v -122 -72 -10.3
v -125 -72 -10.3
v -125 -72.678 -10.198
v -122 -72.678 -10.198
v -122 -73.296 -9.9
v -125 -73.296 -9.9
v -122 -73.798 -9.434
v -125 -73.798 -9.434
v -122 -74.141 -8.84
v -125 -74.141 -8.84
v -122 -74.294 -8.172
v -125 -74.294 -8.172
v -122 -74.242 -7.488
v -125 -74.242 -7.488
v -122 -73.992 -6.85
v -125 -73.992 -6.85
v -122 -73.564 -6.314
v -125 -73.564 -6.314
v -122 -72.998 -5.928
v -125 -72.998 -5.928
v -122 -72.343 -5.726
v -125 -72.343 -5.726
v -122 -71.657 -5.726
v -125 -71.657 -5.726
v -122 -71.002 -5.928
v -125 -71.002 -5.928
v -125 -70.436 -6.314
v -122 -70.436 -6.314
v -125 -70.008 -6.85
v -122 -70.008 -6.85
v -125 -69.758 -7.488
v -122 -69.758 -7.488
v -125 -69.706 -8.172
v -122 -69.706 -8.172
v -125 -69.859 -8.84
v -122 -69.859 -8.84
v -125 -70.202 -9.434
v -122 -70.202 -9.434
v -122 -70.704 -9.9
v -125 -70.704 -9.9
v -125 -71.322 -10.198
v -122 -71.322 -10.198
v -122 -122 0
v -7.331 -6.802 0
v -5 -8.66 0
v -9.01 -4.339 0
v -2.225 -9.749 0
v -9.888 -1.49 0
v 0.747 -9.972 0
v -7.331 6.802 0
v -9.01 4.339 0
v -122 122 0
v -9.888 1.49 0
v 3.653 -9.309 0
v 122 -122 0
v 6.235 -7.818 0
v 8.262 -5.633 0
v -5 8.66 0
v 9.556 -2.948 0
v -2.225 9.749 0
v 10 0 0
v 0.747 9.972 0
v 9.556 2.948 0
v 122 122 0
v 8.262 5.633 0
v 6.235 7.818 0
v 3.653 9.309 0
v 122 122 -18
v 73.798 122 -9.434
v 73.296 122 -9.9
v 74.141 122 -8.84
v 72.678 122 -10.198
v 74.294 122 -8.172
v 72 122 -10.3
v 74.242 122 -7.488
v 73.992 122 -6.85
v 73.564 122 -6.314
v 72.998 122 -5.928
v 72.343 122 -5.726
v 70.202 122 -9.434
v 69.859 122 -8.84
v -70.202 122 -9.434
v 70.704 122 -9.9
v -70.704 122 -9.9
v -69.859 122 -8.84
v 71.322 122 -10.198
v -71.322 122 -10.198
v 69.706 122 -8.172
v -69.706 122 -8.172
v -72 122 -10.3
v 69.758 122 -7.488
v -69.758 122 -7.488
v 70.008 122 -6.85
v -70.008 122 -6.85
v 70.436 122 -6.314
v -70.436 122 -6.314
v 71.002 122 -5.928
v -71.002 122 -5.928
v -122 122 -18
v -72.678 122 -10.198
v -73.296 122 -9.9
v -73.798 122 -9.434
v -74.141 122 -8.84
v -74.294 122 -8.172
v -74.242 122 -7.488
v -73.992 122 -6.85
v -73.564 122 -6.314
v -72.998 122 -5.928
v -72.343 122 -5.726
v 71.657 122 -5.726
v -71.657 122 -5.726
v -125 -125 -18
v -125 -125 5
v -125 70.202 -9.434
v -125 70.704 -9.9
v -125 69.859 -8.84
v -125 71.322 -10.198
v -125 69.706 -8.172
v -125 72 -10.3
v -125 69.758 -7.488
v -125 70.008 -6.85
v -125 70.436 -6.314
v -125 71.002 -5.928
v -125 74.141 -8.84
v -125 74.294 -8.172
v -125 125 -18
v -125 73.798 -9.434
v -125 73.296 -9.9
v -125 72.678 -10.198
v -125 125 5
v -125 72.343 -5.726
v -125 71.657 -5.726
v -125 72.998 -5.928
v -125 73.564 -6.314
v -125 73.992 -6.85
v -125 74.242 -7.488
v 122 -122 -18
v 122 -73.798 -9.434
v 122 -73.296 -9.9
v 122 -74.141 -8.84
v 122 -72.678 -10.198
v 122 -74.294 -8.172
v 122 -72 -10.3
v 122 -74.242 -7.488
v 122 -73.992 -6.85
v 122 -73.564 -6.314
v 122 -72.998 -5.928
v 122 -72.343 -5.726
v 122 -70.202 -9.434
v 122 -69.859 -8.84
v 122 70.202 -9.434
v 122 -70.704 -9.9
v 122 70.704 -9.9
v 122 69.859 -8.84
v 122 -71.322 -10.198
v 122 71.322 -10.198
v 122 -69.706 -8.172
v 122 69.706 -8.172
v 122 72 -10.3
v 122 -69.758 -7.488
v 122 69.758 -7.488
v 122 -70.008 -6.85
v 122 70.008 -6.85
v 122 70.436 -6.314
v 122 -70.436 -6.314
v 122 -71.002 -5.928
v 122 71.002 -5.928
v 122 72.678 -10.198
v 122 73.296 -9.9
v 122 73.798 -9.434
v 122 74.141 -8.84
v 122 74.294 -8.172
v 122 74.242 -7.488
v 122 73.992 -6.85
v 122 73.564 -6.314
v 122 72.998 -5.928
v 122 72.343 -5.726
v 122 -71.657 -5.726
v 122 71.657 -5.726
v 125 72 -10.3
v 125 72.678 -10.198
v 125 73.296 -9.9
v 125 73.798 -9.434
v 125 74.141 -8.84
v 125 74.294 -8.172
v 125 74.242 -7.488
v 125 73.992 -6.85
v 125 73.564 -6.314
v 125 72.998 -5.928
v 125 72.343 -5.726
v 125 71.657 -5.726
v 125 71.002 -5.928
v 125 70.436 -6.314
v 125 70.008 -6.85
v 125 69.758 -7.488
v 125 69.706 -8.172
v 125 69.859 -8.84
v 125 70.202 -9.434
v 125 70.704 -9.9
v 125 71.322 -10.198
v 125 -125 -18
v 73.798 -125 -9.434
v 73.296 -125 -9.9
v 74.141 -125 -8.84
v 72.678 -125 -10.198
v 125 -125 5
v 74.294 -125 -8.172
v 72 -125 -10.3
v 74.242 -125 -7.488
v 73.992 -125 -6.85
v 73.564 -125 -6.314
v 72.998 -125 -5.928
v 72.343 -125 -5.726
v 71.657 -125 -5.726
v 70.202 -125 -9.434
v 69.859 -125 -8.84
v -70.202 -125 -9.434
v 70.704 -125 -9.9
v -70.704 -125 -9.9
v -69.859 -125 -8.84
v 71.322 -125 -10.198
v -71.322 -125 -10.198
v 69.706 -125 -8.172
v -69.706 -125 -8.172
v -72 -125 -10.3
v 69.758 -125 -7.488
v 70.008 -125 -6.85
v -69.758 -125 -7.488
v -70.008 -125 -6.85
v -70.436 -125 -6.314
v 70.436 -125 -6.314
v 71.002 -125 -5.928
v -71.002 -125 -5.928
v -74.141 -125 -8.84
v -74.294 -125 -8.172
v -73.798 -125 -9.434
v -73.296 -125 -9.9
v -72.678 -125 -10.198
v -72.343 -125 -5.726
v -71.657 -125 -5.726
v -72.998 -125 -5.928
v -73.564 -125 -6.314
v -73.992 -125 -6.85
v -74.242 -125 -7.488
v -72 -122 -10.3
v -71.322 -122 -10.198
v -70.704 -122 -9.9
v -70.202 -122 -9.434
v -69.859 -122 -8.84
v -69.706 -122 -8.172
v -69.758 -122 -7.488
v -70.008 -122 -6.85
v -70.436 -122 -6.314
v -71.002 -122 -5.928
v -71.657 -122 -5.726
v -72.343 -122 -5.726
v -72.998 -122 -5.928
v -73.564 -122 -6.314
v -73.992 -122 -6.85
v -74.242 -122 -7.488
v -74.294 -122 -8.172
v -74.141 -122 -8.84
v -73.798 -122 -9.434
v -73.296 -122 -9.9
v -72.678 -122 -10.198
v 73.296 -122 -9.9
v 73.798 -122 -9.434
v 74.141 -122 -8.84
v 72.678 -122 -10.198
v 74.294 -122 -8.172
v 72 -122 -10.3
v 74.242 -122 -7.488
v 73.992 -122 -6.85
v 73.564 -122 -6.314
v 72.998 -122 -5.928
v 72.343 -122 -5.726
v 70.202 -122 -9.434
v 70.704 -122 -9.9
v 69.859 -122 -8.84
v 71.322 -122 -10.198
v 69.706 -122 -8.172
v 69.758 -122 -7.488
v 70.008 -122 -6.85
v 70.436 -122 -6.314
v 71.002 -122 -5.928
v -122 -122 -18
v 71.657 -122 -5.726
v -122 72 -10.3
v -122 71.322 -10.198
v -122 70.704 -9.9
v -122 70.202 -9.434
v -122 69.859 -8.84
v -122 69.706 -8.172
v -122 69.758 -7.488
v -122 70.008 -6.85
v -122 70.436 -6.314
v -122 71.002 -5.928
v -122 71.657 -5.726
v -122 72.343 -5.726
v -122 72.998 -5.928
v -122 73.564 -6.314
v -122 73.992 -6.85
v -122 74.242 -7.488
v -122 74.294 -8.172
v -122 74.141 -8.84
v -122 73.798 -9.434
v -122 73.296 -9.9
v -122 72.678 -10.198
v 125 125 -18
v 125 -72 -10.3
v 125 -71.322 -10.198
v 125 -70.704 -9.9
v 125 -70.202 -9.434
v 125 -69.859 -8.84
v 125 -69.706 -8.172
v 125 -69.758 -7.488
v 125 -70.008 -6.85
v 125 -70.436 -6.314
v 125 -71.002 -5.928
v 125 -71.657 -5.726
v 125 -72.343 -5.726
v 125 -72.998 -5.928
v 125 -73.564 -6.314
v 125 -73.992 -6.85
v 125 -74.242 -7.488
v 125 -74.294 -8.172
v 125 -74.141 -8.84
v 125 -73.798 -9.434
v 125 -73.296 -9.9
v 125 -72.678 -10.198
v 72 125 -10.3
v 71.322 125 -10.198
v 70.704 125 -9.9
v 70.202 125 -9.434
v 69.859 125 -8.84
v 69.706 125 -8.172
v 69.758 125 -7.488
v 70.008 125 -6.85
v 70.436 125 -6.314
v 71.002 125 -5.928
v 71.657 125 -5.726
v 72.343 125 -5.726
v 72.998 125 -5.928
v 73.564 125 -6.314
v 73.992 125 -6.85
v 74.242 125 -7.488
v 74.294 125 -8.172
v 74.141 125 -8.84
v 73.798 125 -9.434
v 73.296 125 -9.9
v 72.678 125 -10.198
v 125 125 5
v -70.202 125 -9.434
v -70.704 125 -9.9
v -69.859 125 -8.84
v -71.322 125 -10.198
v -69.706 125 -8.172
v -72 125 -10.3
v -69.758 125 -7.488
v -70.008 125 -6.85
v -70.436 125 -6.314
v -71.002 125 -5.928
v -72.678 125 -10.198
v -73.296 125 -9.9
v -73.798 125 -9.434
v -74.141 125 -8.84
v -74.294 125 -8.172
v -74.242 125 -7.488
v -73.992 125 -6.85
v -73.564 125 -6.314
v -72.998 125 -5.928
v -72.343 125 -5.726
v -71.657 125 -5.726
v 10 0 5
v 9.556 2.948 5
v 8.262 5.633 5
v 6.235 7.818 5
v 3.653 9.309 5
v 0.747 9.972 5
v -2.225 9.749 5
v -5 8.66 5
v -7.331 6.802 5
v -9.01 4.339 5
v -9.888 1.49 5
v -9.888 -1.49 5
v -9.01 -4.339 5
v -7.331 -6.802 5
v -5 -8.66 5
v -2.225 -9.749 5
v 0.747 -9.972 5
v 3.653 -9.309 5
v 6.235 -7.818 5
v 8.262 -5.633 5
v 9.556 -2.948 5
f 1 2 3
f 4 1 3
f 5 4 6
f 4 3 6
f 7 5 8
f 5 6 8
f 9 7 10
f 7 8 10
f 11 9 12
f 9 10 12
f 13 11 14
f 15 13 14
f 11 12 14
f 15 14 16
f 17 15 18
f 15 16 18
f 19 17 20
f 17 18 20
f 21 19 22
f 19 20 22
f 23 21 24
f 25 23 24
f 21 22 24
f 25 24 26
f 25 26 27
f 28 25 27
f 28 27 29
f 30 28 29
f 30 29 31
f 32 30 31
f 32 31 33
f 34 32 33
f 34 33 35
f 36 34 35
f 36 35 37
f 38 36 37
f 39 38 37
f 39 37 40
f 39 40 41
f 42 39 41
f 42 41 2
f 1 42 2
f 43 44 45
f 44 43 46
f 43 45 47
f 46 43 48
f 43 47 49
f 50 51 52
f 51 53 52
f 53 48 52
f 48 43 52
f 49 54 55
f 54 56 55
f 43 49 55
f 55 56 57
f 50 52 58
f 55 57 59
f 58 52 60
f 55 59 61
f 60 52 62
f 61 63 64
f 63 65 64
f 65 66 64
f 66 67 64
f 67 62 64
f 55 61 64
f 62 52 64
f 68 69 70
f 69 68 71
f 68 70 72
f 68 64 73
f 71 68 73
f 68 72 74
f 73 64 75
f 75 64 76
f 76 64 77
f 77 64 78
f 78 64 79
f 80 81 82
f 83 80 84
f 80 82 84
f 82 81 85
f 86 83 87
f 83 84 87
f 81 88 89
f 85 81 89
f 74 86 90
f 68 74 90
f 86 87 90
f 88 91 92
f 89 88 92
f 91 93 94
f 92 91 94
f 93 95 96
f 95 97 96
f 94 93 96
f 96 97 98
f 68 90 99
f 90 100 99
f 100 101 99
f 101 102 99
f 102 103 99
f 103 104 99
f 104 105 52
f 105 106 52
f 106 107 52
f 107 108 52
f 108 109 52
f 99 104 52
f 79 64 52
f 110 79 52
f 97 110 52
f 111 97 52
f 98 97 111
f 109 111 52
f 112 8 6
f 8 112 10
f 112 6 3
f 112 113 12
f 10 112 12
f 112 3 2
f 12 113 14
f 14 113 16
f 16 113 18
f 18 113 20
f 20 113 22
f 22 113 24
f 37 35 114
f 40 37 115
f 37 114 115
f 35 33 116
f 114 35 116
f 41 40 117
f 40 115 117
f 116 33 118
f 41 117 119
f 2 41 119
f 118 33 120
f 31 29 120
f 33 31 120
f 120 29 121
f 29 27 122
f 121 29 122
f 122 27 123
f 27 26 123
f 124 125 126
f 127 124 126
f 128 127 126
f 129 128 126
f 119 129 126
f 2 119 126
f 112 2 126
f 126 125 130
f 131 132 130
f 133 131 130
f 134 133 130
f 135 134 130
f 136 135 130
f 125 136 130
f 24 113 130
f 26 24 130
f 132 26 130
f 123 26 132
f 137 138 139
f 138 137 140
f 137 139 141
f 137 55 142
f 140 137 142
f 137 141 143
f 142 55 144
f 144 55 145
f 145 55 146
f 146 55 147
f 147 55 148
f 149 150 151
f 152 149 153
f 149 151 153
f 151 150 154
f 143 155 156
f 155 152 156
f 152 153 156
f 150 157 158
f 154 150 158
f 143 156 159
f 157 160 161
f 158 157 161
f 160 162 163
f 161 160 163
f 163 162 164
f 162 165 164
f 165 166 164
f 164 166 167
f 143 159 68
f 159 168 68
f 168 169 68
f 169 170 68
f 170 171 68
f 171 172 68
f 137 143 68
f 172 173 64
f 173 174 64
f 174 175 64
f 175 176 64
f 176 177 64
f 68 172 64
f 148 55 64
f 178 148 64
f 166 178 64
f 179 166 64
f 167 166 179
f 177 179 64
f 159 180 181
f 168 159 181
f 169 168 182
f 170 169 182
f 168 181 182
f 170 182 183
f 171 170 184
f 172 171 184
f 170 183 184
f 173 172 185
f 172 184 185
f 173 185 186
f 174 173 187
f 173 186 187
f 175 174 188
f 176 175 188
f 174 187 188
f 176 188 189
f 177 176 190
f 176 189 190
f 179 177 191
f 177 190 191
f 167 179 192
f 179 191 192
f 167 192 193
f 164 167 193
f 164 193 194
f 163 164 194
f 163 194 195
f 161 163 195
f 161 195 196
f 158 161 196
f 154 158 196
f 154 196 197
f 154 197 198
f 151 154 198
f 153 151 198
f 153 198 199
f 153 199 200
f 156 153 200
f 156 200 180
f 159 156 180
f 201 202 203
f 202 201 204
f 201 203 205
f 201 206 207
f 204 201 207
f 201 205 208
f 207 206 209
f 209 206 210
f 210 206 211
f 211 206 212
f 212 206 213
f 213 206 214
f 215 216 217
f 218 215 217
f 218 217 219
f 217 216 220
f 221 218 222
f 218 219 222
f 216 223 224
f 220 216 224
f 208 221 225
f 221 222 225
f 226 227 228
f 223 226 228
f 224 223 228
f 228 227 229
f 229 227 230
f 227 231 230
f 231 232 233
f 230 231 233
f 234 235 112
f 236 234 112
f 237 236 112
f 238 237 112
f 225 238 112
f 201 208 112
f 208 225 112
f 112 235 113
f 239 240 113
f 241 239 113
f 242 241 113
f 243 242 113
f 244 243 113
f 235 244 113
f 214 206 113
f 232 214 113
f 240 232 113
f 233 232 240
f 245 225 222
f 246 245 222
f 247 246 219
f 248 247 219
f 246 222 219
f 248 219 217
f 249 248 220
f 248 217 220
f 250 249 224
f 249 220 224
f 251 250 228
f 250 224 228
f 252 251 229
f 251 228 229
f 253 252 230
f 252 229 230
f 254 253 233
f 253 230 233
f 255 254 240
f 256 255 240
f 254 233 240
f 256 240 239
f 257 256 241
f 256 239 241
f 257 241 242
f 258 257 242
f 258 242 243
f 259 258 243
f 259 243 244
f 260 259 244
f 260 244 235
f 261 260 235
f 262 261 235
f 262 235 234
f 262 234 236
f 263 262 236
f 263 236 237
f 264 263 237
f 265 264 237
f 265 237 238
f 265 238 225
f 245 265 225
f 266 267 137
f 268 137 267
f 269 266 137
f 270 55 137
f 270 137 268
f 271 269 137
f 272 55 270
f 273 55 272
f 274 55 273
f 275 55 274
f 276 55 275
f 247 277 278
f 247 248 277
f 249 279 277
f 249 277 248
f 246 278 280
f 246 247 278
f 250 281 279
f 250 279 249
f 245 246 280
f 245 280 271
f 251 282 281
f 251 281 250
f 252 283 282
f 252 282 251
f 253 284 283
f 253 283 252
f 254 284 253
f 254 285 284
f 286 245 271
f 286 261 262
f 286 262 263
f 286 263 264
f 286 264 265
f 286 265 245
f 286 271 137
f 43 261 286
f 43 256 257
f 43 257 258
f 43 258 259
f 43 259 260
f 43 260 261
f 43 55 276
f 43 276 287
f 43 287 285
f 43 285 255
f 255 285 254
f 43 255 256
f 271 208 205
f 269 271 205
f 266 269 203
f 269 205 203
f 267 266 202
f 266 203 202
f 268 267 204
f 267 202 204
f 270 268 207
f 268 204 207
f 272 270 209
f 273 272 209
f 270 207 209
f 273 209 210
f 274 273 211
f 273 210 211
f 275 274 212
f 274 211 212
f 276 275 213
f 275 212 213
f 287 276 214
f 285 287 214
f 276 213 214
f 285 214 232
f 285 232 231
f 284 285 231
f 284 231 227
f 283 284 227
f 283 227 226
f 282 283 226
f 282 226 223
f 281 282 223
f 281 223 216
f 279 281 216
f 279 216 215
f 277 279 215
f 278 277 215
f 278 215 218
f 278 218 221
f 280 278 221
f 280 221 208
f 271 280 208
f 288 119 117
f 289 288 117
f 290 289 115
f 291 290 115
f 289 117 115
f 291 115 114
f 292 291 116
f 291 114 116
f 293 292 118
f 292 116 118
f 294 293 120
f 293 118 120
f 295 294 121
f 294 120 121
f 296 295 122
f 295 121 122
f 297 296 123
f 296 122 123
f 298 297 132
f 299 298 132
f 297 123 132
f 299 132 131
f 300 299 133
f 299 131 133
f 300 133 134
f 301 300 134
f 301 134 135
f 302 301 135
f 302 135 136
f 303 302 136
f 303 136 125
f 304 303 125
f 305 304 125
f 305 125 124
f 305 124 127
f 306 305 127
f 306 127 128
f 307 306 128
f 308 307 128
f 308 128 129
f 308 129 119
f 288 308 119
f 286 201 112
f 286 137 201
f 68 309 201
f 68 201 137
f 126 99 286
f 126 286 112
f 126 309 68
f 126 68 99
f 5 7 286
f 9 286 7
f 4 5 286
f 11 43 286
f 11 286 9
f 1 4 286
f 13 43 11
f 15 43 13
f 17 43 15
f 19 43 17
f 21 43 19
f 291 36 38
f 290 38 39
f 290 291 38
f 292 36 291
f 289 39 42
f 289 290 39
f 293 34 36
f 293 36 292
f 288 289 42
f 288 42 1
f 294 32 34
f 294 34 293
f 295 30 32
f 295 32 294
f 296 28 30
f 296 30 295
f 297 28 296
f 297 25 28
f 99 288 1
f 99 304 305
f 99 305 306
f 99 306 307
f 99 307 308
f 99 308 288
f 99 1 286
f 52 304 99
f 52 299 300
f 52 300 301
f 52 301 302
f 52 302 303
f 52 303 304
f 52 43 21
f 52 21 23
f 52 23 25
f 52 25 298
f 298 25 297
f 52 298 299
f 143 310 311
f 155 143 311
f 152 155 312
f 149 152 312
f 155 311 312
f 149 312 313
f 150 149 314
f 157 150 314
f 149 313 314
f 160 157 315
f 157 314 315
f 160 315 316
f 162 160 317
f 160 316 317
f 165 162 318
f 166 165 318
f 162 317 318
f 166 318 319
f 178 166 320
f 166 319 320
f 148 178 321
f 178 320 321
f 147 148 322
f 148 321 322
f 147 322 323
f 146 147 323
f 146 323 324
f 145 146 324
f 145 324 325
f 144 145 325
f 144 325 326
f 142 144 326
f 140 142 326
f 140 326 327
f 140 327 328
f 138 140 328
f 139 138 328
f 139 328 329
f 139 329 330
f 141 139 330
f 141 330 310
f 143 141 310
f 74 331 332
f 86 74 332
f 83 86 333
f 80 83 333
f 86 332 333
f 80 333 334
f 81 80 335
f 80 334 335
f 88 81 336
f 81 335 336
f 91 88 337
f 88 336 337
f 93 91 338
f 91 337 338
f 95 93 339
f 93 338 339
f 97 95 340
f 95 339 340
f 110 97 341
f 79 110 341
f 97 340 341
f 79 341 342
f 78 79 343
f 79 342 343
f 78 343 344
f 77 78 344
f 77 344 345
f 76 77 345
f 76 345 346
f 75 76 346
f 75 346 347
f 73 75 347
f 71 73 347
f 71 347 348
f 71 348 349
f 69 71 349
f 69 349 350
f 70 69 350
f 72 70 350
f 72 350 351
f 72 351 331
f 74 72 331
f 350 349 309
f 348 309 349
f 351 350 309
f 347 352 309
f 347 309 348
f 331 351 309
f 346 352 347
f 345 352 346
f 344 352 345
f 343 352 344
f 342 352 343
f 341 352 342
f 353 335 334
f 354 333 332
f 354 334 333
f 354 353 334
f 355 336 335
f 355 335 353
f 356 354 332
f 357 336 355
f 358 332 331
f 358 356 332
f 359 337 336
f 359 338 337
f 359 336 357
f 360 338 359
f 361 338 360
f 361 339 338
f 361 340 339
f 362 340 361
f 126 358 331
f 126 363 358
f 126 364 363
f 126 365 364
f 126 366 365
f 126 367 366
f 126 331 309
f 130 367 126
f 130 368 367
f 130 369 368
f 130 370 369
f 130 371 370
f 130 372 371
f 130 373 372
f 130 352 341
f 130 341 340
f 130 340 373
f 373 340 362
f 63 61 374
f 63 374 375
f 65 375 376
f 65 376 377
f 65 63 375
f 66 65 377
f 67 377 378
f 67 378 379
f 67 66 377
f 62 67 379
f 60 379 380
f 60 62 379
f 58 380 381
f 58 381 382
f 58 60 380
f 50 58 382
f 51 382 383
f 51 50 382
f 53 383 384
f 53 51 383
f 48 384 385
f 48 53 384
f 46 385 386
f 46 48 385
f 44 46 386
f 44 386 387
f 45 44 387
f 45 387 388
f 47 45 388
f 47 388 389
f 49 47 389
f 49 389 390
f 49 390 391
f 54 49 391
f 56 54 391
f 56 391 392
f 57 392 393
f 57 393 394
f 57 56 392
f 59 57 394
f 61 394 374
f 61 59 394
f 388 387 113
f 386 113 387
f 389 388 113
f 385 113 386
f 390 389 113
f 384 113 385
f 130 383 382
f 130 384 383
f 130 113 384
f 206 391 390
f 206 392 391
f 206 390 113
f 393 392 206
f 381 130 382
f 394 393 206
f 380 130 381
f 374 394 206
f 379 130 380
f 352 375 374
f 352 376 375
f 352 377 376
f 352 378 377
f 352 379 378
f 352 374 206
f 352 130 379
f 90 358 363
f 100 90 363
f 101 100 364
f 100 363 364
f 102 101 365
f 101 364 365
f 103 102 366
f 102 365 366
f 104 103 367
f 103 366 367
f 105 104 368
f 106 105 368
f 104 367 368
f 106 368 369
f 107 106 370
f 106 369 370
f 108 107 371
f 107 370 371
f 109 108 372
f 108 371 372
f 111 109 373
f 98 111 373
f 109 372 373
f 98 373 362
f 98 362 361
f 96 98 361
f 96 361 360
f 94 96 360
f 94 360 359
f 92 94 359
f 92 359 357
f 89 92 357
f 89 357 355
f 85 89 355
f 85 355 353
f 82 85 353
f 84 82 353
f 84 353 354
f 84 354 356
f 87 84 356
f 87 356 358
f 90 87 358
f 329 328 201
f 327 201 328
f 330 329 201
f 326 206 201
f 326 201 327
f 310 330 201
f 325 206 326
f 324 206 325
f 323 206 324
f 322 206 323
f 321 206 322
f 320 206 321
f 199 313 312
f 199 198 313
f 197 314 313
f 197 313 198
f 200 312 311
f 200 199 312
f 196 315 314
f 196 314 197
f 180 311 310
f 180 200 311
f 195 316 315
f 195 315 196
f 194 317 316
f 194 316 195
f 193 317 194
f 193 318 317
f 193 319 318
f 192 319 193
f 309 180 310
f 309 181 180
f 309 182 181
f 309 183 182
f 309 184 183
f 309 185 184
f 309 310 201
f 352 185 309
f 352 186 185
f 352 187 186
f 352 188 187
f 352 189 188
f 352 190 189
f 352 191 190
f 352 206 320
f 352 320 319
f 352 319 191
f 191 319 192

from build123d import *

# Parameters (mm, degrees)
SKETCH_1_W               = 250
SKETCH_1_H               = 250
SKETCH_1_R               = 10
EXTRUDE_1_DEPTH          = 5
SKETCH_3_W               = 250
SKETCH_3_H               = 250
SKETCH_3_W_2             = 244
SKETCH_3_H_2             = 244
EXTRUDE_2_DEPTH          = 18
HOLE_WIZARD_M4_1_D       = 4.6
HOLE_WIZARD_M4_1_DEPTH   = 3
PATTERN_CIRCULAR_1_COUNT = 4


with BuildPart() as part:
    # 스케치1 → 보스-돌출1 (new body)
    with BuildSketch(Plane.XY):
        Rectangle(SKETCH_1_W, SKETCH_1_H)
        Circle(SKETCH_1_R, mode=Mode.SUBTRACT)
    extrude(amount=EXTRUDE_1_DEPTH)

    # 스케치3 → 보스-돌출2 (add)
    with BuildSketch(Plane(origin=(0, 0, 0), x_dir=(-1, 0, 0), z_dir=(0, 0, -1))):
        Rectangle(SKETCH_3_W, SKETCH_3_H)
        Rectangle(SKETCH_3_W_2, SKETCH_3_H_2, mode=Mode.SUBTRACT)
    extrude(amount=EXTRUDE_2_DEPTH)

    # M4 여유 구멍1
    with Locations(Plane.ZY.offset(-122)):
        with Locations((-8, 72), (-8, -72)):
            hole_wizard_m4_1 = Hole(HOLE_WIZARD_M4_1_D / 2, depth=HOLE_WIZARD_M4_1_DEPTH)

    # 원형 패턴1: M4 여유 구멍1 ×4 about axis
    pattern_circular_1_axis = Axis((0, 0, 0), (0, 0, 1))
    for i in range(1, PATTERN_CIRCULAR_1_COUNT):
        add(hole_wizard_m4_1.rotate(pattern_circular_1_axis, i * 360 / PATTERN_CIRCULAR_1_COUNT), mode=Mode.SUBTRACT)


solid = part.part
